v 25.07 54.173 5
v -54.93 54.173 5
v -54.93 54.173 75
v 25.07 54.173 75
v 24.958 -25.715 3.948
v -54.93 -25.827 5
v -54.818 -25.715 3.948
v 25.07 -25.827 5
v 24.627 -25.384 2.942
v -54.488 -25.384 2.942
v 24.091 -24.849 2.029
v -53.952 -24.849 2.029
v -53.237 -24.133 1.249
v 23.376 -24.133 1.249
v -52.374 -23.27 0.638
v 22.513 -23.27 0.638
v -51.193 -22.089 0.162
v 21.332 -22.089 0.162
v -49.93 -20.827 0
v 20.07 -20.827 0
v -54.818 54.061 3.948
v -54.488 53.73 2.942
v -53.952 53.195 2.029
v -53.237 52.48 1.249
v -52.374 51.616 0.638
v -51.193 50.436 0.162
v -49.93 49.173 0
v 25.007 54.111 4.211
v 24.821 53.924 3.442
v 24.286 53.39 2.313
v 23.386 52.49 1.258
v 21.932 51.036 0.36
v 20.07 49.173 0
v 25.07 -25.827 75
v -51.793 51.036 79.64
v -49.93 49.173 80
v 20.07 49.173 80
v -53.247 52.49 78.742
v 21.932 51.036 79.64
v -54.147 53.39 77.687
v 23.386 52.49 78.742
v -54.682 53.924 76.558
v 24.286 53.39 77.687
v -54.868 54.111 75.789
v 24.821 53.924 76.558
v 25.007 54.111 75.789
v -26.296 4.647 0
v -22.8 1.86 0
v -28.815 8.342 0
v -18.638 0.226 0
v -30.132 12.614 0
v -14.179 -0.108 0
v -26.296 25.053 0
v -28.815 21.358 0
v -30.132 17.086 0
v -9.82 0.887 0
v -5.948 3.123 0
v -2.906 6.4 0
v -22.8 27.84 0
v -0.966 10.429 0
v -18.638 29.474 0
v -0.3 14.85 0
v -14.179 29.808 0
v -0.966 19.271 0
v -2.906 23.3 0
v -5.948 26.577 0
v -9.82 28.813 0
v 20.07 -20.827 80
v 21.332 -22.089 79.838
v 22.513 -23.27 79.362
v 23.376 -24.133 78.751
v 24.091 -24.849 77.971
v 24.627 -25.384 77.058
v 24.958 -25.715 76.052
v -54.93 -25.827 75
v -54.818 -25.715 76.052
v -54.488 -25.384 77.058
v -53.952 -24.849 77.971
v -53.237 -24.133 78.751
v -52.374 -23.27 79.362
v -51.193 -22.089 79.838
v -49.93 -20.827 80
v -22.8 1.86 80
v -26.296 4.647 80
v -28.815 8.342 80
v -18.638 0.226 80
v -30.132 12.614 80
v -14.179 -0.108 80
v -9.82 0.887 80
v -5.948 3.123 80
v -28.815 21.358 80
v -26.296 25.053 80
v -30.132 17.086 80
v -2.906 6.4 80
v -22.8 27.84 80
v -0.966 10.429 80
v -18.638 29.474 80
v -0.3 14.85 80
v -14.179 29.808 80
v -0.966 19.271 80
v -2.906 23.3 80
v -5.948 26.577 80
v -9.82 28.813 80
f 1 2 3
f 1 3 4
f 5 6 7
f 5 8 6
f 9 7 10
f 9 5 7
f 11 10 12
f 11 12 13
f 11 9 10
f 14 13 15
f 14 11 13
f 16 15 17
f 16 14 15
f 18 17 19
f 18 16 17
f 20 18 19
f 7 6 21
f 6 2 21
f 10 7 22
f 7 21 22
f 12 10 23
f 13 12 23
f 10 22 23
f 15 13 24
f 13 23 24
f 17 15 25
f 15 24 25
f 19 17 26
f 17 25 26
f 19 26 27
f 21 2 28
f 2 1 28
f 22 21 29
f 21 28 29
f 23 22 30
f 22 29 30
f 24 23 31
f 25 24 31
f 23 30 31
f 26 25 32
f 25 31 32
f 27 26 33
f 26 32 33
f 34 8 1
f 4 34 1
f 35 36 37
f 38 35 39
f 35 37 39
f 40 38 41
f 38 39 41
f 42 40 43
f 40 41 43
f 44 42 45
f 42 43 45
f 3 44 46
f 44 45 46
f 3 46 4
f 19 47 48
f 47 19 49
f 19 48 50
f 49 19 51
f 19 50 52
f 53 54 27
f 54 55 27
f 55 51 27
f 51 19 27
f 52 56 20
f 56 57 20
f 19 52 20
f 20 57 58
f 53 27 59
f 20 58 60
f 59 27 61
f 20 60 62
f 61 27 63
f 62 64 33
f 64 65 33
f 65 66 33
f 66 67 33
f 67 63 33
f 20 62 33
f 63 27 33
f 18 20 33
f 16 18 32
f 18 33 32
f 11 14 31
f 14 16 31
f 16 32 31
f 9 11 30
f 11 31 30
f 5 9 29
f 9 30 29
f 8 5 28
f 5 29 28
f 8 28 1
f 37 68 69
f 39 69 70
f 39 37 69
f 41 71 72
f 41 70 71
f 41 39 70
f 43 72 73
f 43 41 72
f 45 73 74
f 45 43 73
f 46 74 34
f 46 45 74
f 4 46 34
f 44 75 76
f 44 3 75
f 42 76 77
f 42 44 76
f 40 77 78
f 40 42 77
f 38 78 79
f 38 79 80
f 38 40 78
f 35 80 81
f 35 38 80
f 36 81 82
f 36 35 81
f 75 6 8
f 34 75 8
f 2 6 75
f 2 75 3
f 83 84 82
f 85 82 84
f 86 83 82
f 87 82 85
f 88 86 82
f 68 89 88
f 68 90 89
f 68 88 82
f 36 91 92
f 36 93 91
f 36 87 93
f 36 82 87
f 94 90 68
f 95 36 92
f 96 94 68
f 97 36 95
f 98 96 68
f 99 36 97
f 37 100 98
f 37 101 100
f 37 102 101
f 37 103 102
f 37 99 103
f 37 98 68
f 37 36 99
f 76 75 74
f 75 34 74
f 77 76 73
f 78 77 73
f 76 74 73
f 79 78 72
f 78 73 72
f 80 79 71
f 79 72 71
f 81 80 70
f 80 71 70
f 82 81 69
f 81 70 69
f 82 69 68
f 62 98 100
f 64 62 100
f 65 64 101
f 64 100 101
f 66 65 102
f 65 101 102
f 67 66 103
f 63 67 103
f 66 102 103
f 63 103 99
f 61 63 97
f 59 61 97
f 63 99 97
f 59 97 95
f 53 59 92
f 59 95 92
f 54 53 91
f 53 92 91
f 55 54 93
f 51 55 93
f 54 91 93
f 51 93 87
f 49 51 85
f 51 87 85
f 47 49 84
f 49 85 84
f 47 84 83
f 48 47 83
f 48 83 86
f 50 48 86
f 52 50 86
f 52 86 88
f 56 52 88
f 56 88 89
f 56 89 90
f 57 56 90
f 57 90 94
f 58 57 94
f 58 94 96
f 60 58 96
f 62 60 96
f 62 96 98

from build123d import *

# Parameters (mm, degrees)
F0_W     = 80
F0_H     = 80
F1_DEPTH = 80
F2_R     = 15
F3_DEPTH = 80.001
F4_R     = 5
F5_R     = 5


with BuildPart() as f1:
    # F0 (on Top) → F1 (new body)
    with BuildSketch(Plane.XY):
        with Locations((-14.930487, 14.1732)):
            Rectangle(F0_W, F0_H)
    extrude(amount=F1_DEPTH)

    # F2 (on face) → F3 (cut, through all)
    with BuildSketch(Plane.XY.offset(80)):
        with Locations((-15.300001, 14.85)):
            Circle(F2_R)
    extrude(amount=-F3_DEPTH, mode=Mode.SUBTRACT)

    # F4
    f4_edges = [f1.edges().sort_by_distance(p)[0] for p in [
        (-14.930487, -25.8268, 0),
        (-54.930487, 14.1732, 0),
        (25.069513, 14.1732, 0),
        (-14.930487, 54.1732, 0),
    ]]
    fillet(f4_edges, radius=F4_R)

    # F5
    f5_edges = [f1.edges().sort_by_distance(p)[0] for p in [
        (-14.930487, 54.1732, 80),
        (-54.930487, 14.1732, 80),
        (-14.930487, -25.8268, 80),
        (25.069513, 14.1732, 80),
    ]]
    fillet(f5_edges, radius=F5_R)


solid = f1.part
